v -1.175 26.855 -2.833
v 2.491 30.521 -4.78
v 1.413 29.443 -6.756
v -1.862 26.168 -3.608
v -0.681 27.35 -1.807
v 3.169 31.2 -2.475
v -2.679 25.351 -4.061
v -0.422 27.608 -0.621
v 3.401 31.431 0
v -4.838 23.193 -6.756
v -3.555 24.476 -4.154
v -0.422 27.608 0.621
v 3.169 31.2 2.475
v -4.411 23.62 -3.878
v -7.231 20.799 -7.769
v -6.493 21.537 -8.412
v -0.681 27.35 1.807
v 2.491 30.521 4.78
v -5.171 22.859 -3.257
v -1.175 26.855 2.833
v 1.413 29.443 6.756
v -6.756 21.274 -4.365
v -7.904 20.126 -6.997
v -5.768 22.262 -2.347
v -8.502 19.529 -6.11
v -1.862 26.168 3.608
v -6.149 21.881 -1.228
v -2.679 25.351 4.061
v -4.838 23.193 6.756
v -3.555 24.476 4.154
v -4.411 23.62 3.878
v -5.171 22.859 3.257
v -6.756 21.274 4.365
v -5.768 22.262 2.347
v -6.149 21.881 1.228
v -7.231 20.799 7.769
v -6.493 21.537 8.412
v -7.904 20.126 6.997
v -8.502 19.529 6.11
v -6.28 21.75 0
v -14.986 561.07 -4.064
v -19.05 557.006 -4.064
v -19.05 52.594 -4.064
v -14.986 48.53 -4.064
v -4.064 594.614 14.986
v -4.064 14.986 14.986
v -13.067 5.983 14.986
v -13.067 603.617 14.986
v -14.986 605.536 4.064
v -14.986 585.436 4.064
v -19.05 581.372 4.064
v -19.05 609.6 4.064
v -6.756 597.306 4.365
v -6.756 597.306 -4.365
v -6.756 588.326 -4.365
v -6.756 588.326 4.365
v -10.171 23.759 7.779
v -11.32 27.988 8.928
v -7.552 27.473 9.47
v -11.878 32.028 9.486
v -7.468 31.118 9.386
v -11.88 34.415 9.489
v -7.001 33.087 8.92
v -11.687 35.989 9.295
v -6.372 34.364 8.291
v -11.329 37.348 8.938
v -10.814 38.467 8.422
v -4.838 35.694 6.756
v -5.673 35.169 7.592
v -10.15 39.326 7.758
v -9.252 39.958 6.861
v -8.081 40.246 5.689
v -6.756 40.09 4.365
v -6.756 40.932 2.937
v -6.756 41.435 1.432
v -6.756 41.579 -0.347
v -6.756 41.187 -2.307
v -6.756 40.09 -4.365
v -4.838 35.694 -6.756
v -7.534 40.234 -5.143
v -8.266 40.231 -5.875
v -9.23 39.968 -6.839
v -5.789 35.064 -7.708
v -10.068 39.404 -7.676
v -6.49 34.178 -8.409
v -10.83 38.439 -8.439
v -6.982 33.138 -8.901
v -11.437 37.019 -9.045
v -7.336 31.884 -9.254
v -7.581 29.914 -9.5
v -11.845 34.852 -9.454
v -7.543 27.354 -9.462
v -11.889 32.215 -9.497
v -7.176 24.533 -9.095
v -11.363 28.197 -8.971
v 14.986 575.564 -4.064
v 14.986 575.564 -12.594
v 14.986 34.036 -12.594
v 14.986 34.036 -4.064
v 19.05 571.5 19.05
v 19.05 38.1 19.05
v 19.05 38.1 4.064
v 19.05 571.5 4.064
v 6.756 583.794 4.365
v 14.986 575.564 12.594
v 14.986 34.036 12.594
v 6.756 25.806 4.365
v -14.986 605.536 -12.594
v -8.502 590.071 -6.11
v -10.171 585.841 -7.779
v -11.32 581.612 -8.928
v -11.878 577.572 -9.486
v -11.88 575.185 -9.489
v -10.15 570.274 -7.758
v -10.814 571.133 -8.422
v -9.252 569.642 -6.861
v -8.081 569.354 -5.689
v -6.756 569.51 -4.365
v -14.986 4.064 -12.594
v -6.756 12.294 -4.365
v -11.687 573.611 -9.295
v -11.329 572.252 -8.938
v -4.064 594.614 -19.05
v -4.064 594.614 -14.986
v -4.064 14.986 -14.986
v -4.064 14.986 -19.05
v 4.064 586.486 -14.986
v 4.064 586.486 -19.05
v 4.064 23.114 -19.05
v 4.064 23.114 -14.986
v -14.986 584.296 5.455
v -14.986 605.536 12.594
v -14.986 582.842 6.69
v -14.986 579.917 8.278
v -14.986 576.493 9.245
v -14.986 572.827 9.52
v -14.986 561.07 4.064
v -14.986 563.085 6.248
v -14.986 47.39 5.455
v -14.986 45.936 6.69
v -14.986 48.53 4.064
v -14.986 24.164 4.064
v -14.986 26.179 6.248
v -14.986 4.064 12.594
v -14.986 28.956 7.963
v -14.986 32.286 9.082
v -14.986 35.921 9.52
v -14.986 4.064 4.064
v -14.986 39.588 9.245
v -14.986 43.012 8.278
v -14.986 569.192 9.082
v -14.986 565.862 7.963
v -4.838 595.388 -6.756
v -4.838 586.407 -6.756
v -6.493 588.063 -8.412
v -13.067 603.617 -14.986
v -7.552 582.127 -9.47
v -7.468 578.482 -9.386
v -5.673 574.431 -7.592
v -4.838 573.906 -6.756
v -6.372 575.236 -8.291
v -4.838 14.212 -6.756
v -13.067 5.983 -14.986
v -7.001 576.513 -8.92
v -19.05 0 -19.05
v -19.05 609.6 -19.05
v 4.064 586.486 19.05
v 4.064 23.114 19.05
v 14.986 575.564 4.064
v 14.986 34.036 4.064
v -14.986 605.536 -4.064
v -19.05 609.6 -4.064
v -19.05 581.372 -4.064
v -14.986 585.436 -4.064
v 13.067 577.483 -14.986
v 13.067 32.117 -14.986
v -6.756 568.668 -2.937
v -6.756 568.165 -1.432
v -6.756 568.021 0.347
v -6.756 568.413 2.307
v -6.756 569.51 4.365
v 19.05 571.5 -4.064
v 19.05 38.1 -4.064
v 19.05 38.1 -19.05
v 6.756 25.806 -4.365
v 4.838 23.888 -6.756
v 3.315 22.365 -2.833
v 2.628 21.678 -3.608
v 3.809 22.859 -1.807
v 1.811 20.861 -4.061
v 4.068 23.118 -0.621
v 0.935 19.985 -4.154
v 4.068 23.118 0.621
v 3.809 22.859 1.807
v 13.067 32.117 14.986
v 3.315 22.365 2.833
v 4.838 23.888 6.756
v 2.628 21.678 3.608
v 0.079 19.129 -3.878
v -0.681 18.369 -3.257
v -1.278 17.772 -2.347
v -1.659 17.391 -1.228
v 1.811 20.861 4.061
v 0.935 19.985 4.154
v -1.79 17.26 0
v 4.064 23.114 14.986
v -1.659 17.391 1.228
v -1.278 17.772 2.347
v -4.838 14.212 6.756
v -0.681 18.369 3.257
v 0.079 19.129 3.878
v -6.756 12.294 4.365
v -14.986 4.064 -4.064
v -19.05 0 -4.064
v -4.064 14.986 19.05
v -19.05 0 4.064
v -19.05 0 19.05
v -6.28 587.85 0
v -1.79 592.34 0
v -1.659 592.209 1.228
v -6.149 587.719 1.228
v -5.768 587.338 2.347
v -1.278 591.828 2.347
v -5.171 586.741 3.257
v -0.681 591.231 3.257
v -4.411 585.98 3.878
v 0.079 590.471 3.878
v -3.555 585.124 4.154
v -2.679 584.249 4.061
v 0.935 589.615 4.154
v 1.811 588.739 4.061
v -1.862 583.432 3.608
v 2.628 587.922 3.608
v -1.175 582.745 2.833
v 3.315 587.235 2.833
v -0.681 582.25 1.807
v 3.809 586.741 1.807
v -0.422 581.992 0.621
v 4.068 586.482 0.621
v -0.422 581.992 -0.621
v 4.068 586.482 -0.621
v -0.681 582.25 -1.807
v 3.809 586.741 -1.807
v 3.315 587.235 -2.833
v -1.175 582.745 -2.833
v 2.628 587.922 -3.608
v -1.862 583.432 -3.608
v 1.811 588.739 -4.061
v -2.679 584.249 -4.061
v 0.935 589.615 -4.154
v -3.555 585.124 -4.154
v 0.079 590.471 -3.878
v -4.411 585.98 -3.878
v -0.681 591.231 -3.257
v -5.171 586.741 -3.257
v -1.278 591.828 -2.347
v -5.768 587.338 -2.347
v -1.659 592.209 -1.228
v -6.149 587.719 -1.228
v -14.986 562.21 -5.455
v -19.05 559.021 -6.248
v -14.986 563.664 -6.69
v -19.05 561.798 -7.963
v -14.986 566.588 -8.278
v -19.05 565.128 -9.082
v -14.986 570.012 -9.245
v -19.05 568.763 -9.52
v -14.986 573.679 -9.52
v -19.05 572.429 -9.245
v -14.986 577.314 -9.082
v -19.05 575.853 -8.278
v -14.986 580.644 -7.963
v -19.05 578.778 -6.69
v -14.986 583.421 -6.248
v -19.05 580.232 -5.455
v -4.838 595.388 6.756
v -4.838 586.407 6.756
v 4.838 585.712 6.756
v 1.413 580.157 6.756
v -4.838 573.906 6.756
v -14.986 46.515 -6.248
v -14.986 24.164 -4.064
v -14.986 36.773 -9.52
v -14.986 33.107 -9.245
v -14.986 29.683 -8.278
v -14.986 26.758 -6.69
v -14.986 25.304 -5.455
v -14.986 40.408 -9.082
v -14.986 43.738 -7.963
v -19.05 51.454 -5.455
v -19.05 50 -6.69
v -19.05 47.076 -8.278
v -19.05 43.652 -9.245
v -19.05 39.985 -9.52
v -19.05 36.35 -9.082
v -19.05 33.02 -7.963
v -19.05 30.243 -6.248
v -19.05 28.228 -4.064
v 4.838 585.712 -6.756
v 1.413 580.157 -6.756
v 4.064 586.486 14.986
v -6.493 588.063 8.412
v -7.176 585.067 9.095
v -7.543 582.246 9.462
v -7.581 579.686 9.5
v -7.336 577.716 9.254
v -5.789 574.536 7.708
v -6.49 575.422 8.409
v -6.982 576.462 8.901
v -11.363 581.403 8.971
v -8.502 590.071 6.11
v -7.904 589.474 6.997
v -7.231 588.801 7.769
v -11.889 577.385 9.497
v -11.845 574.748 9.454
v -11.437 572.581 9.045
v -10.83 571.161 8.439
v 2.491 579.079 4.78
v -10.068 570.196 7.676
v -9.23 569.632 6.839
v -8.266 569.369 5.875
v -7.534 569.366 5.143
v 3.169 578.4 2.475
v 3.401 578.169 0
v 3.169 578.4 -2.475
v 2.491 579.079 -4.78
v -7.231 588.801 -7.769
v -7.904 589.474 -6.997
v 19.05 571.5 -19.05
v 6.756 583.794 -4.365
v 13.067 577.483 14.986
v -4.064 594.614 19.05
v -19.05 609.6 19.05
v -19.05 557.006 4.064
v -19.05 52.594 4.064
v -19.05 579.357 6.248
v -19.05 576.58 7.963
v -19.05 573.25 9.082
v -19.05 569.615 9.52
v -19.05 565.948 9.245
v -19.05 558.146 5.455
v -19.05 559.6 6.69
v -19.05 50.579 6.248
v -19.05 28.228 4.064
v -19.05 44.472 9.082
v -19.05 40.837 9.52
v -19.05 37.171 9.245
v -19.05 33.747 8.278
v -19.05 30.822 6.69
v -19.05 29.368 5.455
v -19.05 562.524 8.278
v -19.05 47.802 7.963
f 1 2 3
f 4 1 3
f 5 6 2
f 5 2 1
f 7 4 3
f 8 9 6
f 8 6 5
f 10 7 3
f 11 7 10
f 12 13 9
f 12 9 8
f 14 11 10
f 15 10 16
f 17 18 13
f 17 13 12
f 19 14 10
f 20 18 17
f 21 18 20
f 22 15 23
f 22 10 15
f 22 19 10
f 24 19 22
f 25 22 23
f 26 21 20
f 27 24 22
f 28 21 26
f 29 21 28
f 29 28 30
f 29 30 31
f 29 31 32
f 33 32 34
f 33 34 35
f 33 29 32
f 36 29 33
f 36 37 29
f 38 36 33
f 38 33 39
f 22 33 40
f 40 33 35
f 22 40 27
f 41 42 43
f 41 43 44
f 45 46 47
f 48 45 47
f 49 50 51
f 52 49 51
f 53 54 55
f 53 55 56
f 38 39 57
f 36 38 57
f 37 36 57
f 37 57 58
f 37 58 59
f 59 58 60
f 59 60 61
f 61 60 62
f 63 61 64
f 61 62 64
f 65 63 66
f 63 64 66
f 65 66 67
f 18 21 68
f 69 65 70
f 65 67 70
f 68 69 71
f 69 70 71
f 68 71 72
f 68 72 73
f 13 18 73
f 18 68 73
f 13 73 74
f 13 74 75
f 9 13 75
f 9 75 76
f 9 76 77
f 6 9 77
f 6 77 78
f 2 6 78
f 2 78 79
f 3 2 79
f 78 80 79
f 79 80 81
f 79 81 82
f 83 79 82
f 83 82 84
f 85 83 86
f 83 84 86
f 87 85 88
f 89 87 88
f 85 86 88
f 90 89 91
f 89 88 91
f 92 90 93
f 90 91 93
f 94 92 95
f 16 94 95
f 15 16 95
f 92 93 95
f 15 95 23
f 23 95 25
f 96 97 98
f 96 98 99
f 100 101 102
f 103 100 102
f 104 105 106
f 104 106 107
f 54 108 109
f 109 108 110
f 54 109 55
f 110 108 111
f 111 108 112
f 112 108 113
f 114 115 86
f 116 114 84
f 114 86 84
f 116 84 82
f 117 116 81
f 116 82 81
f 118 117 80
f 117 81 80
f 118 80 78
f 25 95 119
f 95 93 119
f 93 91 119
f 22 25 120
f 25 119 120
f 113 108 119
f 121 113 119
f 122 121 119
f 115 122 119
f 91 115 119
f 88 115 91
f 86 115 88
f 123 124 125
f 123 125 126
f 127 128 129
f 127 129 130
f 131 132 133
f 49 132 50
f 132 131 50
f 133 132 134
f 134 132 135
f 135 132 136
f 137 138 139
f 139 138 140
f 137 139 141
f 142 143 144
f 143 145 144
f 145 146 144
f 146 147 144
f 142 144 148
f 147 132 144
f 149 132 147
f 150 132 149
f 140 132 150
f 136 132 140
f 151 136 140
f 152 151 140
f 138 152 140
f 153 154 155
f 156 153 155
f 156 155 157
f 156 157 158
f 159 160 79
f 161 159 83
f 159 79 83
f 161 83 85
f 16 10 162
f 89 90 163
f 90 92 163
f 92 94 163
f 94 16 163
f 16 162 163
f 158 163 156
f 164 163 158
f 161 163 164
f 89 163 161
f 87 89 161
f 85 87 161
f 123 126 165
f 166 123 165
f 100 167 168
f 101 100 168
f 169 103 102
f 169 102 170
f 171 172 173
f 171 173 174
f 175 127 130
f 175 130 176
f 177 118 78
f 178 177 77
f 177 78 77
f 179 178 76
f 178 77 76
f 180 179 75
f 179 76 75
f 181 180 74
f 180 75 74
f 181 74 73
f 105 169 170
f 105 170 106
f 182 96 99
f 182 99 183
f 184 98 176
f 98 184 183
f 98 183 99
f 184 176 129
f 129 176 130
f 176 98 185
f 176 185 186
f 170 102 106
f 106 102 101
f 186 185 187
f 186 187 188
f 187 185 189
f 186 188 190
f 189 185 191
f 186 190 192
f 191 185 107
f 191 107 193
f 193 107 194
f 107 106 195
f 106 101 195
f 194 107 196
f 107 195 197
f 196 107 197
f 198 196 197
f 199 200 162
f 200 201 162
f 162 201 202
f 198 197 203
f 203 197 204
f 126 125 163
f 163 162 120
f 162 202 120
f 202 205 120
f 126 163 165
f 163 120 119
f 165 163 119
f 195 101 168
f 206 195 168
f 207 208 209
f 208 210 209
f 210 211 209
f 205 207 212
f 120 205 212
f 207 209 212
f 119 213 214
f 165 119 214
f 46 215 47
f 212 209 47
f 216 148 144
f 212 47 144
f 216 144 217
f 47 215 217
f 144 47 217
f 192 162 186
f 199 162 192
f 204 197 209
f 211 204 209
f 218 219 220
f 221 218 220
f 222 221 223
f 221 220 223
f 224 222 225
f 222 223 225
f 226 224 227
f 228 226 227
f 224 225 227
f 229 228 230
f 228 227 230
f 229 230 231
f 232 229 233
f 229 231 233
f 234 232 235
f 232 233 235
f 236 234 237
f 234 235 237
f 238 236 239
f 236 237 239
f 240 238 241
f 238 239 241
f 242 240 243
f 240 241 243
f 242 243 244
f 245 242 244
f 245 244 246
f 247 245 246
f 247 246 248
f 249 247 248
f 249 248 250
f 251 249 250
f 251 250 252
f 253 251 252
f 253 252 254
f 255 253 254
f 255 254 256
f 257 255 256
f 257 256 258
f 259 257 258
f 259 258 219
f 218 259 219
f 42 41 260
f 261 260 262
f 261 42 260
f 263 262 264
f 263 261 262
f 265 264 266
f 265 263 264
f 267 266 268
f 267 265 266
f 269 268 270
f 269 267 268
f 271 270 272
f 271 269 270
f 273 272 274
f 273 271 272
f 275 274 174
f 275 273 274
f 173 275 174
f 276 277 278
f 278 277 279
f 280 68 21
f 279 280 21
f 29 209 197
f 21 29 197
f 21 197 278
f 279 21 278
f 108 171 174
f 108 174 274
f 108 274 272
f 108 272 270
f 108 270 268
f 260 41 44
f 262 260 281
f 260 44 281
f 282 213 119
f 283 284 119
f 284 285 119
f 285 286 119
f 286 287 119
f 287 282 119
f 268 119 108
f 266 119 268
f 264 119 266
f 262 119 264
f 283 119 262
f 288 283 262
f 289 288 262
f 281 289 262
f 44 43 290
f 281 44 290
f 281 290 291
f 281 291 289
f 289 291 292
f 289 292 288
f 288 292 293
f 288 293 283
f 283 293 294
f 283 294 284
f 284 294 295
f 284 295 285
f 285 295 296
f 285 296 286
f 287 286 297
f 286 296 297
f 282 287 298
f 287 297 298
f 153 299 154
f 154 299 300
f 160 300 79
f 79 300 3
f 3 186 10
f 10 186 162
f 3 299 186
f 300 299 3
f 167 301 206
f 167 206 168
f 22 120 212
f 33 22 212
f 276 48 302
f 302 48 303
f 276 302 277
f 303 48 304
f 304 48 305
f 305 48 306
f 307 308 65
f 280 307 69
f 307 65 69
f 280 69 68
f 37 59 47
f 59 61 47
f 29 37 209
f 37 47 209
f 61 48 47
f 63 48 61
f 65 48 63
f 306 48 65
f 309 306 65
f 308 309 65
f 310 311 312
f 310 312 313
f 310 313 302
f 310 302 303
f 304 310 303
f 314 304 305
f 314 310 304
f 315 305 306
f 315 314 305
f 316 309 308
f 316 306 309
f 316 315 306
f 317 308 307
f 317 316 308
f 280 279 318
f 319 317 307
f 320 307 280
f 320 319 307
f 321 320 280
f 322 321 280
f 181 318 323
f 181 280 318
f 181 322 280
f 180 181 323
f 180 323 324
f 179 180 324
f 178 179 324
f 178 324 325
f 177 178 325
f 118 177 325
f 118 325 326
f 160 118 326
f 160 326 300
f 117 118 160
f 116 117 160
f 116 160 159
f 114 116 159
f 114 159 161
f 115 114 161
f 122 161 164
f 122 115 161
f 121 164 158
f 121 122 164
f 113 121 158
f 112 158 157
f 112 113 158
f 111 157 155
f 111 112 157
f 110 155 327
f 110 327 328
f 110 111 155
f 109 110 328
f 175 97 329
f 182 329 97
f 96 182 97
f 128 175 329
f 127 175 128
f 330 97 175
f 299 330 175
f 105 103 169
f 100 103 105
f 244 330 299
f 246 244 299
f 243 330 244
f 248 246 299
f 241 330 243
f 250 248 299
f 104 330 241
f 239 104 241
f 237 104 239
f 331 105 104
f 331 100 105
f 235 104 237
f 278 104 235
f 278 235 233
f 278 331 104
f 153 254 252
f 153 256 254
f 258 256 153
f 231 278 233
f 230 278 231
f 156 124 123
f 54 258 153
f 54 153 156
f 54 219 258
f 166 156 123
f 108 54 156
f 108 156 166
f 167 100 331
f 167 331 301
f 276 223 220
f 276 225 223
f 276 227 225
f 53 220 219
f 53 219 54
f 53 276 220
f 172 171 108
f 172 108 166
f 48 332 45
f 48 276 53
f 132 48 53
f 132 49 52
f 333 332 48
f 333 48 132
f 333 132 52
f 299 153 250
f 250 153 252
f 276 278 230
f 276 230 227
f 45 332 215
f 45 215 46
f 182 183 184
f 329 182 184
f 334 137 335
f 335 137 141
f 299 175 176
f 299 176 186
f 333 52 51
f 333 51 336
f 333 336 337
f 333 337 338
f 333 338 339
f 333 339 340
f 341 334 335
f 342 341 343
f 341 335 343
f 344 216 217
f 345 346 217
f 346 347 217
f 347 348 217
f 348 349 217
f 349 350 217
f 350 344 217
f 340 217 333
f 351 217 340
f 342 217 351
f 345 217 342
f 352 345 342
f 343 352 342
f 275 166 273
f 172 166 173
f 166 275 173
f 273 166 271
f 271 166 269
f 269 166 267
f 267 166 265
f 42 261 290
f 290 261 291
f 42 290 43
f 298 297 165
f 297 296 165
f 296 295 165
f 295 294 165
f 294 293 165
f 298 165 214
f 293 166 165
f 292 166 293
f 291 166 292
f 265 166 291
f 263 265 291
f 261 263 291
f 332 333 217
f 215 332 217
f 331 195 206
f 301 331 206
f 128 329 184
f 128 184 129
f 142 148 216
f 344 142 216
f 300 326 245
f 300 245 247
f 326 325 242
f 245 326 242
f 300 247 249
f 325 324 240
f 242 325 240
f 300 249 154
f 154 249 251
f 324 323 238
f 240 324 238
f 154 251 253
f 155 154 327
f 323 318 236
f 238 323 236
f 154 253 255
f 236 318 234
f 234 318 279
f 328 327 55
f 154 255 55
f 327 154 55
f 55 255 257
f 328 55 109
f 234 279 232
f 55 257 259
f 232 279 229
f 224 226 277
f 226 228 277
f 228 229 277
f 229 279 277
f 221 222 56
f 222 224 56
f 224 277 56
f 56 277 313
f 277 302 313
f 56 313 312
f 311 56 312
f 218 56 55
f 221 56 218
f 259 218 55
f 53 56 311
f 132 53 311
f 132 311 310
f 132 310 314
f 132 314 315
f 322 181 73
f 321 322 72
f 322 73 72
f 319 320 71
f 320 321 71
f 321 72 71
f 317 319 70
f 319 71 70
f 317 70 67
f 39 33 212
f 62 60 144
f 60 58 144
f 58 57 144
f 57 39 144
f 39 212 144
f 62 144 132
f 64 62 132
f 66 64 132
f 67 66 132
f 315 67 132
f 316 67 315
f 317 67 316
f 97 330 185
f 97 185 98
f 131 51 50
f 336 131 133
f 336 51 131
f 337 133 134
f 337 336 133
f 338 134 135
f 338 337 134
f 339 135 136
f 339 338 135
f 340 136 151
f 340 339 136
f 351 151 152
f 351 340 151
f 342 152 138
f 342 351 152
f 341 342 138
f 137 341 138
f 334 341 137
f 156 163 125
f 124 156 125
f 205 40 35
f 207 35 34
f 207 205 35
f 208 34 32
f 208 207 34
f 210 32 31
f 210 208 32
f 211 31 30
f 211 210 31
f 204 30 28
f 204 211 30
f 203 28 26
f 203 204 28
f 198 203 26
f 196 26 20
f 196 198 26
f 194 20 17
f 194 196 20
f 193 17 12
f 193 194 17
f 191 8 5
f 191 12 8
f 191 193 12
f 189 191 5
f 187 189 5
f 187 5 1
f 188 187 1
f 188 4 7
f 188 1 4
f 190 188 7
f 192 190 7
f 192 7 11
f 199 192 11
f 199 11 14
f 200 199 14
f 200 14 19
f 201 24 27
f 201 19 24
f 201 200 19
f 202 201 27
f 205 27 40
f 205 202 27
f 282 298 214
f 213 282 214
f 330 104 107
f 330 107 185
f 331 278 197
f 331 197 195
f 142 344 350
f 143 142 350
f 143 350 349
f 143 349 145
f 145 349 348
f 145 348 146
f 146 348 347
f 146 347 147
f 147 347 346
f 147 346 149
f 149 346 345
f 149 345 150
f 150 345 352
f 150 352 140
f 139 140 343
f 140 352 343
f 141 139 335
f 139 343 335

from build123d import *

# Parameters (mm, degrees)
EXTRUDE1_DEPTH = 609.6
EXTRUDE2_DEPTH = 612.086468922
SKETCH5_R      = 4.1656
EXTRUDE3_DEPTH = 445.930684208
SKETCH6_R      = 9.525
EXTRUDE4_DEPTH = 44.45


# Read off the part's stored shape, not the designer's step: 1515<1>
with BuildPart() as part:
    # Sketch1<2> → Extrude1 (new body)
    with BuildSketch(Plane(origin=(0, 0, 0), x_dir=(1, 0, 0), z_dir=(0, 1, 0))):
        Polygon((-6.7564, 4.364749804), (-6.7564, -4.364749804), (-14.986, -12.594349804), (-14.986, -4.064), (-19.05, -4.064), (-19.05, -19.05), (-4.064, -19.05), (-4.064, -14.986), (-13.067127258, -14.986), (-4.837527258, -6.7564), (4.837527258, -6.7564), (13.067127258, -14.986), (4.064, -14.986), (4.064, -19.05), (19.05, -19.05), (19.05, -4.064), (14.986, -4.064), (14.986, -12.594349804), (6.7564, -4.364749804), (6.7564, 4.364749804), (14.986, 12.594349804), (14.986, 4.064), (19.05, 4.064), (19.05, 19.05), (4.064, 19.05), (4.064, 14.986), (13.067127258, 14.986), (4.837527258, 6.7564), (-4.837527258, 6.7564), (-13.067127258, 14.986), (-4.064, 14.986), (-4.064, 19.05), (-19.05, 19.05), (-19.05, 4.064), (-14.986, 4.064), (-14.986, 12.594349804), align=None)
    extrude(amount=EXTRUDE1_DEPTH)

    # Sketch2 → Extrude2 (cut, through all)
    with BuildSketch(Plane.XY.offset(19.05)):
        Polygon((-19.05, 609.6), (19.05, 609.6), (19.05, 571.5), align=None)
        Polygon((19.05, 0), (19.05, 38.1), (-19.05, 0), align=None)
    extrude(amount=-EXTRUDE2_DEPTH, mode=Mode.SUBTRACT)

    # Sketch5 → Extrude3 (cut, through all)
    with BuildSketch(Plane(origin=(295.275, 295.275, 0), x_dir=(-0.7071067811865561, 0.7071067811865389, 5.599314837219468e-15), z_dir=(0.7071067811865389, 0.7071067811865561, 5.599314837219606e-15))):
        with Locations((415.947677993, 0)):
            Circle(SKETCH5_R)
    extrude3 = extrude(amount=-EXTRUDE3_DEPTH, mode=Mode.SUBTRACT)

    # Sketch6 → Extrude4 (cut)
    with BuildSketch(Plane(origin=(259.353975516, 259.353975516, 0), x_dir=(-0.7071067811865515, 0.7071067811865437, 0), z_dir=(0.7071067811865437, 0.7071067811865515, 0))):
        with Locations((415.947677993, 0)):
            Circle(SKETCH6_R)
    extrude4 = extrude(amount=EXTRUDE4_DEPTH, mode=Mode.SUBTRACT)

    # Mirror14: Extrude3, Extrude4 across plane
    add(extrude3.mirror(Plane.ZX.offset(304.8)), mode=Mode.SUBTRACT)
    add(extrude4.mirror(Plane.ZX.offset(304.8)), mode=Mode.SUBTRACT)


solid = part.part
